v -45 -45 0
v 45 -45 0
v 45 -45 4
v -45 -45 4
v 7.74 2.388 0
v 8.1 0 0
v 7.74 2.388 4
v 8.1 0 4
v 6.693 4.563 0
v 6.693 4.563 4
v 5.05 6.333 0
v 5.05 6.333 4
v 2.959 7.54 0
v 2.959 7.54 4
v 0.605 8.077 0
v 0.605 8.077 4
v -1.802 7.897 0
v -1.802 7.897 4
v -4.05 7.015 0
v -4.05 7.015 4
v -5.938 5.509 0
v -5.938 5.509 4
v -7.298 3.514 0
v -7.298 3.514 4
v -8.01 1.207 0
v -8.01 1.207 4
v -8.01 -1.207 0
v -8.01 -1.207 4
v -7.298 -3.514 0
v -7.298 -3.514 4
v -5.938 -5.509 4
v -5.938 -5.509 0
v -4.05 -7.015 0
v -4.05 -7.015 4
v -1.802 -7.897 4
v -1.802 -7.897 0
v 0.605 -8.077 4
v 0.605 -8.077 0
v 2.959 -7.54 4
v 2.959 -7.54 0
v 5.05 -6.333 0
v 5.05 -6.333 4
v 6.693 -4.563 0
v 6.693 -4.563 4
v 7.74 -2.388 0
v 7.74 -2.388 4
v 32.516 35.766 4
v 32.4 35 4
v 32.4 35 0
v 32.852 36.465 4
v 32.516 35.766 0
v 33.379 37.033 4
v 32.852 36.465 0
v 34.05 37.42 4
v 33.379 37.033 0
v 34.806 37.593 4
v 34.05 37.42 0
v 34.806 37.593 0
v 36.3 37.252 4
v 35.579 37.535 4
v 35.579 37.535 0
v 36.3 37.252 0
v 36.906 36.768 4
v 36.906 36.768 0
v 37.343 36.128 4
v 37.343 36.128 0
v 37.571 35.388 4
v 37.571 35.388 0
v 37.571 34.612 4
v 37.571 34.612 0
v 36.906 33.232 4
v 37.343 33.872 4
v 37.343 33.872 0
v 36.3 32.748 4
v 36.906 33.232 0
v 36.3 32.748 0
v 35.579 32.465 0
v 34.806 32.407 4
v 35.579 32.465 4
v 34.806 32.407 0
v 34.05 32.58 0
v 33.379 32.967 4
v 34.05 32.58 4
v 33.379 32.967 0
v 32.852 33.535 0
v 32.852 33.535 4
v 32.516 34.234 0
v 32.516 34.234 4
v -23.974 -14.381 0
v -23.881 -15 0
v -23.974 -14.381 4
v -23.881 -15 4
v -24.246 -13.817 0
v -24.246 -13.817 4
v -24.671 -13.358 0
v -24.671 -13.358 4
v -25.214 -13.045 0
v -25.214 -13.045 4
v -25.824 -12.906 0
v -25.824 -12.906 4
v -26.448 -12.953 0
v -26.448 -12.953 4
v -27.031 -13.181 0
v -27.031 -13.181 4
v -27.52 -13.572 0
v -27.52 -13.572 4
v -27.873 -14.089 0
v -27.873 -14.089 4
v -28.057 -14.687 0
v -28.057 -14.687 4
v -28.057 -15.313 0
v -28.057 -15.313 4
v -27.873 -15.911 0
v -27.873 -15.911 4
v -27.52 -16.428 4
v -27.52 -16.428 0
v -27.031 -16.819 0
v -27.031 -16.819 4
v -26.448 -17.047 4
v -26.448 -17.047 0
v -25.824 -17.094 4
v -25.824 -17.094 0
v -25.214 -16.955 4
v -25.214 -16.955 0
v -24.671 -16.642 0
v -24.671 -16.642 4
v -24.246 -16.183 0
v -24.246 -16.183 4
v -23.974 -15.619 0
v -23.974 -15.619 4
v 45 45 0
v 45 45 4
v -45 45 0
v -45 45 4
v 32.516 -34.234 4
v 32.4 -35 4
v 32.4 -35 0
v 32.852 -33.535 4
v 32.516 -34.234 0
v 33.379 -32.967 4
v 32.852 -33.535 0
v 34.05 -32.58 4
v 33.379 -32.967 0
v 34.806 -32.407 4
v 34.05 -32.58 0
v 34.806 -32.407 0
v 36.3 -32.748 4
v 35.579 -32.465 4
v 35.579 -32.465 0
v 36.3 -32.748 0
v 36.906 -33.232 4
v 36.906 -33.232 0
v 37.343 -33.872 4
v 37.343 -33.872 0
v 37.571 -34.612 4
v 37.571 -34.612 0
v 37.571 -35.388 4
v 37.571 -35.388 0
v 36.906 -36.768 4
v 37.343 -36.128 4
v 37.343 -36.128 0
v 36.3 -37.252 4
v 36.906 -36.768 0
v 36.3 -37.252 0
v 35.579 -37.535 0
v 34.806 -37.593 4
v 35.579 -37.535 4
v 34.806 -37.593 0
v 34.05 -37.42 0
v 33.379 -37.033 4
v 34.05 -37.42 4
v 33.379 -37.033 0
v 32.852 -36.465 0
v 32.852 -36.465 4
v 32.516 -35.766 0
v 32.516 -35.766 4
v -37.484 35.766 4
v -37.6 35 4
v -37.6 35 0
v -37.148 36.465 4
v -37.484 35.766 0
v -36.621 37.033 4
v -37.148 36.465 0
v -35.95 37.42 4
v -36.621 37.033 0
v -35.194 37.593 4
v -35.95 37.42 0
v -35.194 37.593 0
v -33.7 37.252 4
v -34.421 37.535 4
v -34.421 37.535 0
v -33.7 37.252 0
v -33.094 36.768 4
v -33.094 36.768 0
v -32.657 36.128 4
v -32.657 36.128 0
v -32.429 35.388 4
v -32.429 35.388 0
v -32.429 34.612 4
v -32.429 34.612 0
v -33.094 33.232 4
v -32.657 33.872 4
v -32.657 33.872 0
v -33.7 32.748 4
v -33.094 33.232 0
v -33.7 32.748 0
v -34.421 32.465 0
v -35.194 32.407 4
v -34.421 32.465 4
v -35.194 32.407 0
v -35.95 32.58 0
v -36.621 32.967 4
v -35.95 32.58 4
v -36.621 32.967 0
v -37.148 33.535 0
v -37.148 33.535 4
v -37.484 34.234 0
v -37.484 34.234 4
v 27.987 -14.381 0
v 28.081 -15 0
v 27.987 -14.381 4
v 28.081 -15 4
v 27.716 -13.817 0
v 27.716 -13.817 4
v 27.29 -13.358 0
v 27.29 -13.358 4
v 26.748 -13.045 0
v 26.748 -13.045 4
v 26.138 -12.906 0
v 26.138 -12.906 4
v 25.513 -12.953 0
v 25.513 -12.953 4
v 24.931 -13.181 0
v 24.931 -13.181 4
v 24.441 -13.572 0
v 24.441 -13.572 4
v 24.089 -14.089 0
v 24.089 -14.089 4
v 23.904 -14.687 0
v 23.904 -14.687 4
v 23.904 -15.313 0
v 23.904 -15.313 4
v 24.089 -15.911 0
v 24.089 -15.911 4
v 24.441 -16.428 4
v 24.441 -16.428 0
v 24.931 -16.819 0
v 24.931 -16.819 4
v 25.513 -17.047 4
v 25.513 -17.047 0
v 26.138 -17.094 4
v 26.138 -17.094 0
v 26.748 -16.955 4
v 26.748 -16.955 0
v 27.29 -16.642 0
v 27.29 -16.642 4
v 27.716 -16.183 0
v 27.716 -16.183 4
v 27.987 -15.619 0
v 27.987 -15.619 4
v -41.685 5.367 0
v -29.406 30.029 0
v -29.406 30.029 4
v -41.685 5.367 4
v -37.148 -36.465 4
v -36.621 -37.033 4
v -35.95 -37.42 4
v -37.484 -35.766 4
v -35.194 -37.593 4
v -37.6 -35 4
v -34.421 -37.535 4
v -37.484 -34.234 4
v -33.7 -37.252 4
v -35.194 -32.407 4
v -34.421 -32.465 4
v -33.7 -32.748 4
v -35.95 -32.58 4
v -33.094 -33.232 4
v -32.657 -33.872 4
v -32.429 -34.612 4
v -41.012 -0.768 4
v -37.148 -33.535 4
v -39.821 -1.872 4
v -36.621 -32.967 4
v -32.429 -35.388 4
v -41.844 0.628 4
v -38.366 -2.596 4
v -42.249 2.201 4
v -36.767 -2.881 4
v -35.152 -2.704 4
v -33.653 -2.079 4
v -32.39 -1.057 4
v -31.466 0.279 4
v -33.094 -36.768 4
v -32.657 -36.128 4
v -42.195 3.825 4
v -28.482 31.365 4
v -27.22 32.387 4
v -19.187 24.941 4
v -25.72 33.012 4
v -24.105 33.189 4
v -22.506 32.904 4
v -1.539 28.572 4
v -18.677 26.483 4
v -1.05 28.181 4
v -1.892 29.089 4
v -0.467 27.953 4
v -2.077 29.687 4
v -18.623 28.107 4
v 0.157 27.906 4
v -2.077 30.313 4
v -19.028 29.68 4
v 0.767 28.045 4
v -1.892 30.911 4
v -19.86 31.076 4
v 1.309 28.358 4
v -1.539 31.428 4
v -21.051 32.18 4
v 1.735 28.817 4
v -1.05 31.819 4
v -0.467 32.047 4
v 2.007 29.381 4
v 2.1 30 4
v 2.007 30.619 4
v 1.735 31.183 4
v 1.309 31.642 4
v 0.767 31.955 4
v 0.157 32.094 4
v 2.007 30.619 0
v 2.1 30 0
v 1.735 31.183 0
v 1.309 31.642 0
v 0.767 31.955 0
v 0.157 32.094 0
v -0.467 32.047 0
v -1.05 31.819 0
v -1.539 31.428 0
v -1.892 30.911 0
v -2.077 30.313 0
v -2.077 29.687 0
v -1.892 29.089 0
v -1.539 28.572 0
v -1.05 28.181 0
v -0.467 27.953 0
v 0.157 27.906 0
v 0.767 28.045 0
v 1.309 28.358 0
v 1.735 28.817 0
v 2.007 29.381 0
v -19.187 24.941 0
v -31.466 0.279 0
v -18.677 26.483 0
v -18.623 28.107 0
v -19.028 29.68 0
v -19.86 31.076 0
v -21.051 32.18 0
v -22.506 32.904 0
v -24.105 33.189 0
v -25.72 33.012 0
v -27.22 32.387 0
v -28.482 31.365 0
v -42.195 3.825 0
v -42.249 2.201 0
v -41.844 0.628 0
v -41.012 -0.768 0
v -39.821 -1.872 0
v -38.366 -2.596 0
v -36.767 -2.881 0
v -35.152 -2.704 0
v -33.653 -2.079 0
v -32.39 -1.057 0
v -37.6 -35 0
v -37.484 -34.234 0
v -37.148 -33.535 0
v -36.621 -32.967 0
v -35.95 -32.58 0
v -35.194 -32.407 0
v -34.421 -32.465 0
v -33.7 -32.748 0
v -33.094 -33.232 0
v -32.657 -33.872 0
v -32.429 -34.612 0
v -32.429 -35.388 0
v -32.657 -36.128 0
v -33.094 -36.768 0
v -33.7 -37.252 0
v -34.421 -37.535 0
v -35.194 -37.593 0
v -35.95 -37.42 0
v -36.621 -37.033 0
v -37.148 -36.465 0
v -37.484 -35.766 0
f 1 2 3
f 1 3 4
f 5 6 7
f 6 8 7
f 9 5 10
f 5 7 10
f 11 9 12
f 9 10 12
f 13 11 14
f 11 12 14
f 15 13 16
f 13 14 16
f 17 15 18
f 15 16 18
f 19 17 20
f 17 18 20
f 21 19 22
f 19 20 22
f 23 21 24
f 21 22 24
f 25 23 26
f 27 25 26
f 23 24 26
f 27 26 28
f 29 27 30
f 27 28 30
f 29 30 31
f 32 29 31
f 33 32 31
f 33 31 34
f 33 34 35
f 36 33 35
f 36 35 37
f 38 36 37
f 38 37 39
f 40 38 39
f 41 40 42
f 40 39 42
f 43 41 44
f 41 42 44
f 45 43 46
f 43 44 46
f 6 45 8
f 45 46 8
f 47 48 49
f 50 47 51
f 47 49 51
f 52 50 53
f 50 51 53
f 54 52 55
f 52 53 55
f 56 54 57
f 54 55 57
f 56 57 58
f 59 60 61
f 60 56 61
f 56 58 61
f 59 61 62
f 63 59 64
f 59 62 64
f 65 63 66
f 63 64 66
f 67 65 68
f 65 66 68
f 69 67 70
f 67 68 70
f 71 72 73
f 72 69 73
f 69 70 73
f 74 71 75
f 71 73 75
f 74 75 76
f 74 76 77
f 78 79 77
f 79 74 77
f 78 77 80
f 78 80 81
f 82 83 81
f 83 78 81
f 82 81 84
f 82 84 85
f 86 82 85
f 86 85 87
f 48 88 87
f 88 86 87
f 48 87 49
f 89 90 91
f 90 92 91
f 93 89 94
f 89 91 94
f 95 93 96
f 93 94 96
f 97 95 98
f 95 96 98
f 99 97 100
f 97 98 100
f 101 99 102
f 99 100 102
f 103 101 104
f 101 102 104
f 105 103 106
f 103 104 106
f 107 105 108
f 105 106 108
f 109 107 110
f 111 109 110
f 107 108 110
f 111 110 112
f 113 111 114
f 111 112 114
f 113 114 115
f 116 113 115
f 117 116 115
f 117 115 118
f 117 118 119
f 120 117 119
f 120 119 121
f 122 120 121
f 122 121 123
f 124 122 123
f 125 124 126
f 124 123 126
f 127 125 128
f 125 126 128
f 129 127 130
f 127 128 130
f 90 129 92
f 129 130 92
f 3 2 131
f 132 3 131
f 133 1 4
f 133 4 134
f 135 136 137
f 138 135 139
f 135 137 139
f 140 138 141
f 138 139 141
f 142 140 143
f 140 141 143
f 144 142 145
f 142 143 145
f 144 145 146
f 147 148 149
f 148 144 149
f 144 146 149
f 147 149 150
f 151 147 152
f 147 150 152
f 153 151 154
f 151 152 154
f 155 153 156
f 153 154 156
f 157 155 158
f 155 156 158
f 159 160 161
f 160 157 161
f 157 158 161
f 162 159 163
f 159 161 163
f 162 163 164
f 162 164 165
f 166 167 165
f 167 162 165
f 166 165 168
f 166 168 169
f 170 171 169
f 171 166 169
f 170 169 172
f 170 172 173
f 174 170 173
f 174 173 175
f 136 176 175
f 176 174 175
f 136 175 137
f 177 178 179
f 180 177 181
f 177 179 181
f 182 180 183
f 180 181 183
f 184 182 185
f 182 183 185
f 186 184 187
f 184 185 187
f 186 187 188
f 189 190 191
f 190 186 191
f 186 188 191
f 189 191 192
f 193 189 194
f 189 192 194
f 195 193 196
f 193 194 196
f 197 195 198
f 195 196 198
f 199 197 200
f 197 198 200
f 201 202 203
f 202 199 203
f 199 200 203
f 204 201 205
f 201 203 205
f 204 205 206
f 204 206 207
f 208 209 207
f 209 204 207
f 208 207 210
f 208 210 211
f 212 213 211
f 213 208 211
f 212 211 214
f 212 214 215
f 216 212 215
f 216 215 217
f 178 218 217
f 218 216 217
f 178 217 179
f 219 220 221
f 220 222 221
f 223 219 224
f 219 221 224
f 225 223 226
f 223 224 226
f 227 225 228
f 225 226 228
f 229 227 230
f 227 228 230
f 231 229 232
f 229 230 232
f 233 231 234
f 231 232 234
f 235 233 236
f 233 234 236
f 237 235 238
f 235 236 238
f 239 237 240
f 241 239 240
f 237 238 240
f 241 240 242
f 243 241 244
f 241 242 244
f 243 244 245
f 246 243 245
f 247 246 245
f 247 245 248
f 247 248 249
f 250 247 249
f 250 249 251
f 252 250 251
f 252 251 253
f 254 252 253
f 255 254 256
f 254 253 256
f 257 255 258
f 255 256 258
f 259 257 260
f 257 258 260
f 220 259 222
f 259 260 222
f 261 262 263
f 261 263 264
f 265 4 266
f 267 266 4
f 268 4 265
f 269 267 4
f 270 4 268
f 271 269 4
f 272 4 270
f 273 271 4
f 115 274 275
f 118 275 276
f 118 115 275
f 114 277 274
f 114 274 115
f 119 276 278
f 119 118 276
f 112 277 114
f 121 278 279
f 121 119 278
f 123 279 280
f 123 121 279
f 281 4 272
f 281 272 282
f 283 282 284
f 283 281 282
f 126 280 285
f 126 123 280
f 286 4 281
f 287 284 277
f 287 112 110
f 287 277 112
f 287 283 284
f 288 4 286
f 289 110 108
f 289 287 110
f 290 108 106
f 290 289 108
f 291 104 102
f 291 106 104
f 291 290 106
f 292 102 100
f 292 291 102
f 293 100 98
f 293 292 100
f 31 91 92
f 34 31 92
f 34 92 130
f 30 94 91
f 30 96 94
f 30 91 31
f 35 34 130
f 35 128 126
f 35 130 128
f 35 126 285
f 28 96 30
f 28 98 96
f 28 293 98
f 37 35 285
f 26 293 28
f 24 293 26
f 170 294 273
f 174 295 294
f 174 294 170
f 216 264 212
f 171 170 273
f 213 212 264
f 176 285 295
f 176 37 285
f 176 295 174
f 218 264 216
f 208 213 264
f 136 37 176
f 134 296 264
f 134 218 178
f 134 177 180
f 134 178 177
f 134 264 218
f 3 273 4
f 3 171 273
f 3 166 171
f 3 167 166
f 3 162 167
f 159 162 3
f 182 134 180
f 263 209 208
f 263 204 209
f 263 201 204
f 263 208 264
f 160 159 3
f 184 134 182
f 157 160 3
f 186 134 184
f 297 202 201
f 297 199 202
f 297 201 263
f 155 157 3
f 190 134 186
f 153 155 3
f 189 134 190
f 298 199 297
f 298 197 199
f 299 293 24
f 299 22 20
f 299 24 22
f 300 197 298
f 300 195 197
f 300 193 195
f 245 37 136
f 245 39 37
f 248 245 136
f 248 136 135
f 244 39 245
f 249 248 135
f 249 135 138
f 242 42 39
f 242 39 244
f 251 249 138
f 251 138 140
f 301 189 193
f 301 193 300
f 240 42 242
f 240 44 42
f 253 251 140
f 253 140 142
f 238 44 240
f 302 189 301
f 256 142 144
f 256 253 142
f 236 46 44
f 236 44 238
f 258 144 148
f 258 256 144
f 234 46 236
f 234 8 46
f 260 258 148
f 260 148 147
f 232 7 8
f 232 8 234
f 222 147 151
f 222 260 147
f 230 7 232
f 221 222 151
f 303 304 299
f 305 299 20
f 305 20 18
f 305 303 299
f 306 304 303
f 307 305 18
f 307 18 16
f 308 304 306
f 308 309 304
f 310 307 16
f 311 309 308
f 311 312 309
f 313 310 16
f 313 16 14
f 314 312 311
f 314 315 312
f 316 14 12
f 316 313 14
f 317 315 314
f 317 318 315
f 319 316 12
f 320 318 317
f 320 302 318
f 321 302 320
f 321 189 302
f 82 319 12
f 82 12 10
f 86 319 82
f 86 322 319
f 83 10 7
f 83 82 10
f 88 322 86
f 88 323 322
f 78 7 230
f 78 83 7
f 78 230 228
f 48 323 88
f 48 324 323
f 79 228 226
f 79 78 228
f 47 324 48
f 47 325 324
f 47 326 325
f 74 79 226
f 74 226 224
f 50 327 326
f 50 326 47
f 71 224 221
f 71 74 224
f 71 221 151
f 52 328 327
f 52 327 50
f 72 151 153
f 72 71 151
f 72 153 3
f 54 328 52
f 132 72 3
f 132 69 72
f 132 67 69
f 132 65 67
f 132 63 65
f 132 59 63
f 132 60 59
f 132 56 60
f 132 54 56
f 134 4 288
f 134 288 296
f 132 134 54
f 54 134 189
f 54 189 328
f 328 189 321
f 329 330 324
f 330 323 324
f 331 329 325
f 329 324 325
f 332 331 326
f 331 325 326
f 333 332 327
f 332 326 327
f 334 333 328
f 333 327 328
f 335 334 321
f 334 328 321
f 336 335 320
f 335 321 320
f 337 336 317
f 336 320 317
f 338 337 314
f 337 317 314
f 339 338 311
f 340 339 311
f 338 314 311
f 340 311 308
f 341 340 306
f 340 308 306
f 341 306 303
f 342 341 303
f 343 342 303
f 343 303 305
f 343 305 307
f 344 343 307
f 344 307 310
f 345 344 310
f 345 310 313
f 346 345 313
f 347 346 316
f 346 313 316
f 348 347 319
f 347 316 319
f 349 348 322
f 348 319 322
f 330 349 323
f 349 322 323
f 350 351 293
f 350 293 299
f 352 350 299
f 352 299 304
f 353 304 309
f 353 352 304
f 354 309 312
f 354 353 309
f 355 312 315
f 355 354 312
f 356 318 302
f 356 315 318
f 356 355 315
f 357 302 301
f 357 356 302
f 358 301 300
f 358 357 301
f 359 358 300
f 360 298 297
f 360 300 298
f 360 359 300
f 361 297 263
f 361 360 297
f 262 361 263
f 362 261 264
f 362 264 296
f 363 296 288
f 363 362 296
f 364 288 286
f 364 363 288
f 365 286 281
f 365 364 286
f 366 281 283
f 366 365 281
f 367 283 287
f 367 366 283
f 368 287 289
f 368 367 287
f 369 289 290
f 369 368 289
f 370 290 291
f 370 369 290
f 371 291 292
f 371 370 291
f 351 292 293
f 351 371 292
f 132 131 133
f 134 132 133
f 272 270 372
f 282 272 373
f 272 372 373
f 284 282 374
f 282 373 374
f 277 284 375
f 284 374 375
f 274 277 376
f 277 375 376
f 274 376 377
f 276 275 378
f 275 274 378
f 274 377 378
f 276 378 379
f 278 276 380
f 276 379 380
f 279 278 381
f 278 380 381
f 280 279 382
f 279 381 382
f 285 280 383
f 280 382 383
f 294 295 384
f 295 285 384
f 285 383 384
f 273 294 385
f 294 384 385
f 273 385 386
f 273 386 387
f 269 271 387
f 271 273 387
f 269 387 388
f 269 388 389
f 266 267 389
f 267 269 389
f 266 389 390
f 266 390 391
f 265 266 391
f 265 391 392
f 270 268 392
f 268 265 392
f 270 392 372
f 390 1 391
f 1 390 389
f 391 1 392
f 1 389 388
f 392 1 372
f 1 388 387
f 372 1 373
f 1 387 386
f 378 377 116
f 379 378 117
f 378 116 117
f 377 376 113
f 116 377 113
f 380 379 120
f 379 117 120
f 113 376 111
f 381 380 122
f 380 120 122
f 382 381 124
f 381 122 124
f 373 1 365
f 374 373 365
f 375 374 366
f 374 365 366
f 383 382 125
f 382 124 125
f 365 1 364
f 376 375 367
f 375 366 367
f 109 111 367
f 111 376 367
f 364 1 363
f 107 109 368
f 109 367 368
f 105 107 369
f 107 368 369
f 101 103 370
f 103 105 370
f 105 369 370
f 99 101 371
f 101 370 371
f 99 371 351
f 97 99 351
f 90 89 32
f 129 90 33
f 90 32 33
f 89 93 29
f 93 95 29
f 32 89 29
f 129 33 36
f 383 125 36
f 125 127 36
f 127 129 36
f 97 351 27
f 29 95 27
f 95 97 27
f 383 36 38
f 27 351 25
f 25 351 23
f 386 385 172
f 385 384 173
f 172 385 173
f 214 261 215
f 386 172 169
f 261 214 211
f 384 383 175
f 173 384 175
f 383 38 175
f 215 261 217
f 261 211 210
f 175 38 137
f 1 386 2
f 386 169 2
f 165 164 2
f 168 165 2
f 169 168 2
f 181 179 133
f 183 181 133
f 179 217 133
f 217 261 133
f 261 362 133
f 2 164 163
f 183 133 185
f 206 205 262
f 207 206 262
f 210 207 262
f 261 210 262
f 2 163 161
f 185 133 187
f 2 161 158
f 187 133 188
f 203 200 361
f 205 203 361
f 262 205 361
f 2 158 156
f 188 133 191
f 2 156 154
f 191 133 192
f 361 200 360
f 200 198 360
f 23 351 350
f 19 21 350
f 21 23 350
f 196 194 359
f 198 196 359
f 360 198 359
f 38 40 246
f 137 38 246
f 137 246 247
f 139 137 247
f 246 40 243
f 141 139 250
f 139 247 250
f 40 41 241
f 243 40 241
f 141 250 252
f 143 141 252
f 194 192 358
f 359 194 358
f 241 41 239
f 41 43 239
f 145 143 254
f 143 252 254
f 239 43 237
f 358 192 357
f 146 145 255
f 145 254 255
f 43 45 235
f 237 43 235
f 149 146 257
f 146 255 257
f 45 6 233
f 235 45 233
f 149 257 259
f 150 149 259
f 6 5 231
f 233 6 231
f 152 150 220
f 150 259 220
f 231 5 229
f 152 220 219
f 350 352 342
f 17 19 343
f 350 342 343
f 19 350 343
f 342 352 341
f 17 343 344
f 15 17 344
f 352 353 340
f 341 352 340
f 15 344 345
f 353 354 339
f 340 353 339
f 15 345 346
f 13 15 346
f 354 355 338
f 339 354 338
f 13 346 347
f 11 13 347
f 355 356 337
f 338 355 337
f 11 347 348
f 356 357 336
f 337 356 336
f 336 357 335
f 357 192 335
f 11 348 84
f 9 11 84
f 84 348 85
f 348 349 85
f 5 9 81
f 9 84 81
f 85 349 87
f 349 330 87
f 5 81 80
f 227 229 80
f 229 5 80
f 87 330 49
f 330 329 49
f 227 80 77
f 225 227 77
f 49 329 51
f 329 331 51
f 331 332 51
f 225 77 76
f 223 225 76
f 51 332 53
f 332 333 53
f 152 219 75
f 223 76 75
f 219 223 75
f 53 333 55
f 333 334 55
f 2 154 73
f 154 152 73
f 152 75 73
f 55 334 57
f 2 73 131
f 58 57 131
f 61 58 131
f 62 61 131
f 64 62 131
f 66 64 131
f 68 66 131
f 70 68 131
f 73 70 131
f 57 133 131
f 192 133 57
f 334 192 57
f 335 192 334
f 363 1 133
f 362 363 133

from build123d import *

# Parameters (mm, degrees)
SKETCH_1_R           = 2.5
SKETCH_1_R_2         = 8
EXTRUDE_1_DEPTH      = 2
SKETCH_2_R           = 34
CUT_EXTRUDE_1_DEPTH  = 0.5
SKETCH_3_R           = 2
CUT_EXTRUDE_2_DEPTH  = 28.5
SKETCH_5_R           = 2.1
CUT_EXTRUDE_3_DEPTH  = 10
SKETCH_4_R           = 2.6
CUT_EXTRUDE_4_DEPTH  = 10
SKETCH_7_W           = 125
SKETCH_7_H           = 125
SKETCH_7_W_2         = 80
SKETCH_7_H_2         = 80
EXTRUDE_2_DEPTH      = 2
SKETCH_8_R           = 2.760887892
EXTRUDE_3_DEPTH      = 2
SKETCH_9_R           = 2.6
CUT_EXTRUDE_5_DEPTH  = 2
CUT_EXTRUDE_7_DEPTH  = 2
EXTRUDE_START        = -2
SKETCH_11_W          = 250
SKETCH_11_H          = 250
SKETCH_11_R          = 2.1
SKETCH_11_R_2        = 8
EXTRUDE_4_DEPTH      = 2
SKETCH_13_R          = 2.6
CUT_EXTRUDE_9_DEPTH  = 51
SKETCH_16_R          = 34
CUT_EXTRUDE_11_DEPTH = 1
SKETCH_18_W          = 250
SKETCH_18_H          = 250
SKETCH_18_W_2        = 90
SKETCH_18_H_2        = 90
CUT_EXTRUDE_12_DEPTH = 10
SKETCH_20_R          = 2.6
CUT_EXTRUDE_14_DEPTH = 10
SKETCH_21_R          = 8.1
CUT_EXTRUDE_15_DEPTH = 10
SKETCH_24_R          = 34.1
CUT_EXTRUDE_17_DEPTH = 1
EXTRUDE_START_2      = 1
SKETCH_25_R          = 34.1
SKETCH_25_R_2        = 2.1
SKETCH_25_R_3        = 8.1
EXTRUDE_5_DEPTH      = 1
CUT_EXTRUDE_20_DEPTH = 10
SKETCH_31_W          = 90
SKETCH_31_H          = 90
SKETCH_31_R          = 2.1
SKETCH_31_R_2        = 8.1
SKETCH_31_R_3        = 2.6
EXTRUDE_6_DEPTH      = 4
EXTRUDE_START_3      = -4
EXTRUDE_7_DEPTH      = 4
CUT_EXTRUDE_21_DEPTH = 10


with BuildPart() as part:
    # 草图1 → 凸台-拉伸1 (new body)
    with BuildSketch(Plane.XY):
        Polygon((-33, 40), (-40, 40), (-40, 33), (-40, -33), (-40, -40), (40, -40), (40, 40), (33, 40), align=None)
        with Locations((-33, -33)):
            Circle(SKETCH_1_R, mode=Mode.SUBTRACT)
        with Locations((33, -30.5)):
            Circle(SKETCH_1_R, mode=Mode.SUBTRACT)
        Circle(SKETCH_1_R_2, mode=Mode.SUBTRACT)
        with Locations((-33, 33)):
            Circle(SKETCH_1_R, mode=Mode.SUBTRACT)
        with Locations((33, 33)):
            Circle(SKETCH_1_R, mode=Mode.SUBTRACT)
    extrude(amount=EXTRUDE_1_DEPTH)

    # 草图2 → 切除-拉伸1 (cut)
    with BuildSketch(Plane.XY.offset(2)):
        Circle(SKETCH_2_R)
    extrude(amount=-CUT_EXTRUDE_1_DEPTH, mode=Mode.SUBTRACT)

    # 草图3 → 切除-拉伸2 (cut)
    with BuildSketch(Plane.XY.offset(1.5)):
        with Locations((0, 30)):
            Circle(SKETCH_3_R)
        with Locations((25.980762114, -15)):
            Circle(SKETCH_3_R)
        with Locations((-25.980762114, -15)):
            Circle(SKETCH_3_R)
    extrude(amount=-CUT_EXTRUDE_2_DEPTH, mode=Mode.SUBTRACT)

    # 草图5 → 切除-拉伸3 (cut)
    with BuildSketch(Plane.XY.offset(1.5)):
        with Locations((25.980762114, -15)):
            Circle(SKETCH_5_R)
        with Locations((0, 30)):
            Circle(SKETCH_5_R)
        with Locations((-25.980762114, -15)):
            Circle(SKETCH_5_R)
    extrude(amount=-CUT_EXTRUDE_3_DEPTH, mode=Mode.SUBTRACT)

    # 草图4 → 切除-拉伸4 (cut)
    with BuildSketch(Plane.XY.offset(2)):
        with Locations((-33, 33)):
            Circle(SKETCH_4_R)
        with Locations((33, 33)):
            Circle(SKETCH_4_R)
        with Locations((33, -30.5)):
            Circle(SKETCH_4_R)
        with Locations((-33, -33)):
            Circle(SKETCH_4_R)
    extrude(amount=-CUT_EXTRUDE_4_DEPTH, mode=Mode.SUBTRACT)

    # 草图7 → 凸台-拉伸2 (add)
    with BuildSketch(Plane(origin=(0, 0, 0), x_dir=(-1, 0, 0), z_dir=(0, 0, -1))):
        Rectangle(SKETCH_7_W, SKETCH_7_H)
        Rectangle(SKETCH_7_W_2, SKETCH_7_H_2, mode=Mode.SUBTRACT)
    extrude(amount=-EXTRUDE_2_DEPTH)

    # 草图8 → 凸台-拉伸3 (add)
    with BuildSketch(Plane(origin=(0, 0, 0), x_dir=(-1, 0, 0), z_dir=(0, 0, -1))):
        with Locations((-33, -30.5)):
            Circle(SKETCH_8_R)
    extrude(amount=-EXTRUDE_3_DEPTH)

    # 草图9 → 切除-拉伸5 (cut)
    with BuildSketch(Plane(origin=(0, 0, 0), x_dir=(-1, 0, 0), z_dir=(0, 0, -1))):
        with Locations((-33, -34.063377391)):
            Circle(SKETCH_9_R)
    extrude(amount=-CUT_EXTRUDE_5_DEPTH, mode=Mode.SUBTRACT)

    # 草图10 → 切除-拉伸7 (cut)
    with BuildSketch(Plane(origin=(0, 0, 0), x_dir=(-1, 0, 0), z_dir=(0, 0, -1))):
        with BuildLine():
            Line((13.58008401, -47.982963501), (-13.58008401, -47.982963501))
            ThreePointArc((-13.58008401, -47.982963501), (-20.483293381, -41.079754129), (-13.58008401, -34.176544757))
            Line((-13.58008401, -34.176544757), (13.58008401, -34.176544757))
            ThreePointArc((13.58008401, -34.176544757), (20.483293381, -41.079754129), (13.58008401, -47.982963501))
        make_face()
    extrude(amount=-CUT_EXTRUDE_7_DEPTH, mode=Mode.SUBTRACT)

    # 草图11 → 凸台-拉伸4 (add)
    with BuildSketch(Plane(origin=(0, 0, 0), x_dir=(-1, 0, 0), z_dir=(0, 0, -1)).offset(EXTRUDE_START)):
        Rectangle(SKETCH_11_W, SKETCH_11_H)
        with Locations(Location((25.980762114, -15, 0), (0, 0, 180))):
            Circle(SKETCH_11_R, mode=Mode.SUBTRACT)
        Circle(SKETCH_11_R_2, mode=Mode.SUBTRACT)
        with Locations(Location((-25.980762114, -15, 0), (0, 0, 180))):
            Circle(SKETCH_11_R, mode=Mode.SUBTRACT)
        with Locations(Location((0, 30, 0), (0, 0, 180))):
            Circle(SKETCH_11_R, mode=Mode.SUBTRACT)
    extrude(amount=EXTRUDE_4_DEPTH)

    # 草图13 → 切除-拉伸9 (cut)
    with BuildSketch(Plane(origin=(0, 0, 0), x_dir=(-1, 0, 0), z_dir=(0, 0, -1))):
        with Locations((-105, 105)):
            Circle(SKETCH_13_R)
        with Locations((105, 105)):
            Circle(SKETCH_13_R)
        with Locations((-105, -105)):
            Circle(SKETCH_13_R)
        with Locations((105, -98.771678495)):
            Circle(SKETCH_13_R)
    extrude(amount=-CUT_EXTRUDE_9_DEPTH, mode=Mode.SUBTRACT)

    # 草图16 → 切除-拉伸11 (cut)
    with BuildSketch(Plane.XY.offset(2)):
        Circle(SKETCH_16_R)
    extrude(amount=-CUT_EXTRUDE_11_DEPTH, mode=Mode.SUBTRACT)

    # 草图18 → 切除-拉伸12 (cut)
    with BuildSketch(Plane(origin=(0, 0, 0), x_dir=(-1, 0, 0), z_dir=(0, 0, -1))):
        Rectangle(SKETCH_18_W, SKETCH_18_H)
        Rectangle(SKETCH_18_W_2, SKETCH_18_H_2, mode=Mode.SUBTRACT)
    extrude(amount=-CUT_EXTRUDE_12_DEPTH, mode=Mode.SUBTRACT)

    # 草图20 → 切除-拉伸14 (cut)
    with BuildSketch(Plane(origin=(0, 0, 0), x_dir=(-1, 0, 0), z_dir=(0, 0, -1))):
        with Locations((-35, 35)):
            Circle(SKETCH_20_R)
        with Locations((35, 35)):
            Circle(SKETCH_20_R)
        with Locations((35, -35)):
            Circle(SKETCH_20_R)
        with Locations((-35, -35)):
            Circle(SKETCH_20_R)
    extrude(amount=-CUT_EXTRUDE_14_DEPTH, mode=Mode.SUBTRACT)

    # 草图21 → 切除-拉伸15 (cut)
    with BuildSketch(Plane.XY.offset(1)):
        Circle(SKETCH_21_R)
    extrude(amount=-CUT_EXTRUDE_15_DEPTH, mode=Mode.SUBTRACT)

    # 草图24 → 切除-拉伸17 (cut)
    with BuildSketch(Plane.XY.offset(2)):
        Circle(SKETCH_24_R)
    extrude(amount=-CUT_EXTRUDE_17_DEPTH, mode=Mode.SUBTRACT)

    # 草图25 → 凸台-拉伸5 (add)
    with BuildSketch(Plane.XY.offset(1).offset(EXTRUDE_START_2)):
        Circle(SKETCH_25_R)
        with Locations((25.980762114, -15)):
            Circle(SKETCH_25_R_2, mode=Mode.SUBTRACT)
        with Locations((0, 30)):
            Circle(SKETCH_25_R_2, mode=Mode.SUBTRACT)
        Circle(SKETCH_25_R_3, mode=Mode.SUBTRACT)
        with Locations((-25.980762114, -15)):
            Circle(SKETCH_25_R_2, mode=Mode.SUBTRACT)
    extrude(amount=-EXTRUDE_5_DEPTH)

    # 草图30 → 切除-拉伸20 (cut)
    with BuildSketch(Plane(origin=(0, 0, 0), x_dir=(-1, 0, 0), z_dir=(0, 0, -1))):
        with BuildLine():
            Line((-34.25879914, 10.195171229), (-25.460402767, 24.557274857))
            ThreePointArc((-25.460402767, 24.557274857), (-19.205340885, 26.059890654), (-17.702725087, 19.804828771))
            Line((-17.702725087, 19.804828771), (-26.50112146, 5.442725143))
            ThreePointArc((-26.50112146, 5.442725143), (-32.756183343, 3.940109346), (-34.25879914, 10.195171229))
        make_face()
    extrude(amount=-CUT_EXTRUDE_20_DEPTH, mode=Mode.SUBTRACT)

    # 草图31 → 凸台-拉伸6 (add)
    with BuildSketch(Plane.XY):
        Rectangle(SKETCH_31_W, SKETCH_31_H)
        with Locations((-25.980762114, -15)):
            Circle(SKETCH_31_R, mode=Mode.SUBTRACT)
        Circle(SKETCH_31_R_2, mode=Mode.SUBTRACT)
        with Locations((0, 30)):
            Circle(SKETCH_31_R, mode=Mode.SUBTRACT)
        with Locations((25.980762114, -15)):
            Circle(SKETCH_31_R, mode=Mode.SUBTRACT)
        with Locations(Location((-35, 35, 0), (0, 0, 180))):
            Circle(SKETCH_31_R_3, mode=Mode.SUBTRACT)
        with Locations(Location((35, 35, 0), (0, 0, 180))):
            Circle(SKETCH_31_R_3, mode=Mode.SUBTRACT)
        with Locations(Location((-35, -35, 0), (0, 0, 180))):
            Circle(SKETCH_31_R_3, mode=Mode.SUBTRACT)
        with Locations(Location((35, -35, 0), (0, 0, 180))):
            Circle(SKETCH_31_R_3, mode=Mode.SUBTRACT)
        with BuildLine():
            Line((17.702725087, 19.804828771), (26.50112146, 5.442725143))
            ThreePointArc((26.50112146, 5.442725143), (32.756183343, 3.940109346), (34.25879914, 10.195171229))
            Line((34.25879914, 10.195171229), (25.460402767, 24.557274857))
            ThreePointArc((25.460402767, 24.557274857), (19.205340885, 26.059890654), (17.702725087, 19.804828771))
        make_face(mode=Mode.SUBTRACT)
    extrude(amount=EXTRUDE_6_DEPTH)

    # 草图32 → 凸台-拉伸7 (add)
    with BuildSketch(Plane.XY.offset(4).offset(EXTRUDE_START_3)):
        with BuildLine():
            Line((17.702725087, 19.804828771), (26.50112146, 5.442725143))
            ThreePointArc((26.50112146, 5.442725143), (32.756183343, 3.940109346), (34.25879914, 10.195171229))
            Line((34.25879914, 10.195171229), (25.460402767, 24.557274857))
            ThreePointArc((25.460402767, 24.557274857), (19.205340885, 26.059890654), (17.702725087, 19.804828771))
        make_face()
    extrude(amount=EXTRUDE_7_DEPTH)

    # 草图33 → 切除-拉伸21 (cut)
    with BuildSketch(Plane(origin=(0, 0, 0), x_dir=(-1, 0, 0), z_dir=(0, 0, -1))):
        with BuildLine():
            Line((31.466175781, 0.279206161), (19.18721424, 24.940909849))
            ThreePointArc((19.18721424, 24.940909849), (21.75266604, 32.594262797), (29.406018987, 30.028810997))
            Line((29.406018987, 30.028810997), (41.684980529, 5.367107309))
            ThreePointArc((41.684980529, 5.367107309), (39.119528729, -2.286245639), (31.466175781, 0.279206161))
        make_face()
    extrude(amount=-CUT_EXTRUDE_21_DEPTH, mode=Mode.SUBTRACT)


solid = part.part
